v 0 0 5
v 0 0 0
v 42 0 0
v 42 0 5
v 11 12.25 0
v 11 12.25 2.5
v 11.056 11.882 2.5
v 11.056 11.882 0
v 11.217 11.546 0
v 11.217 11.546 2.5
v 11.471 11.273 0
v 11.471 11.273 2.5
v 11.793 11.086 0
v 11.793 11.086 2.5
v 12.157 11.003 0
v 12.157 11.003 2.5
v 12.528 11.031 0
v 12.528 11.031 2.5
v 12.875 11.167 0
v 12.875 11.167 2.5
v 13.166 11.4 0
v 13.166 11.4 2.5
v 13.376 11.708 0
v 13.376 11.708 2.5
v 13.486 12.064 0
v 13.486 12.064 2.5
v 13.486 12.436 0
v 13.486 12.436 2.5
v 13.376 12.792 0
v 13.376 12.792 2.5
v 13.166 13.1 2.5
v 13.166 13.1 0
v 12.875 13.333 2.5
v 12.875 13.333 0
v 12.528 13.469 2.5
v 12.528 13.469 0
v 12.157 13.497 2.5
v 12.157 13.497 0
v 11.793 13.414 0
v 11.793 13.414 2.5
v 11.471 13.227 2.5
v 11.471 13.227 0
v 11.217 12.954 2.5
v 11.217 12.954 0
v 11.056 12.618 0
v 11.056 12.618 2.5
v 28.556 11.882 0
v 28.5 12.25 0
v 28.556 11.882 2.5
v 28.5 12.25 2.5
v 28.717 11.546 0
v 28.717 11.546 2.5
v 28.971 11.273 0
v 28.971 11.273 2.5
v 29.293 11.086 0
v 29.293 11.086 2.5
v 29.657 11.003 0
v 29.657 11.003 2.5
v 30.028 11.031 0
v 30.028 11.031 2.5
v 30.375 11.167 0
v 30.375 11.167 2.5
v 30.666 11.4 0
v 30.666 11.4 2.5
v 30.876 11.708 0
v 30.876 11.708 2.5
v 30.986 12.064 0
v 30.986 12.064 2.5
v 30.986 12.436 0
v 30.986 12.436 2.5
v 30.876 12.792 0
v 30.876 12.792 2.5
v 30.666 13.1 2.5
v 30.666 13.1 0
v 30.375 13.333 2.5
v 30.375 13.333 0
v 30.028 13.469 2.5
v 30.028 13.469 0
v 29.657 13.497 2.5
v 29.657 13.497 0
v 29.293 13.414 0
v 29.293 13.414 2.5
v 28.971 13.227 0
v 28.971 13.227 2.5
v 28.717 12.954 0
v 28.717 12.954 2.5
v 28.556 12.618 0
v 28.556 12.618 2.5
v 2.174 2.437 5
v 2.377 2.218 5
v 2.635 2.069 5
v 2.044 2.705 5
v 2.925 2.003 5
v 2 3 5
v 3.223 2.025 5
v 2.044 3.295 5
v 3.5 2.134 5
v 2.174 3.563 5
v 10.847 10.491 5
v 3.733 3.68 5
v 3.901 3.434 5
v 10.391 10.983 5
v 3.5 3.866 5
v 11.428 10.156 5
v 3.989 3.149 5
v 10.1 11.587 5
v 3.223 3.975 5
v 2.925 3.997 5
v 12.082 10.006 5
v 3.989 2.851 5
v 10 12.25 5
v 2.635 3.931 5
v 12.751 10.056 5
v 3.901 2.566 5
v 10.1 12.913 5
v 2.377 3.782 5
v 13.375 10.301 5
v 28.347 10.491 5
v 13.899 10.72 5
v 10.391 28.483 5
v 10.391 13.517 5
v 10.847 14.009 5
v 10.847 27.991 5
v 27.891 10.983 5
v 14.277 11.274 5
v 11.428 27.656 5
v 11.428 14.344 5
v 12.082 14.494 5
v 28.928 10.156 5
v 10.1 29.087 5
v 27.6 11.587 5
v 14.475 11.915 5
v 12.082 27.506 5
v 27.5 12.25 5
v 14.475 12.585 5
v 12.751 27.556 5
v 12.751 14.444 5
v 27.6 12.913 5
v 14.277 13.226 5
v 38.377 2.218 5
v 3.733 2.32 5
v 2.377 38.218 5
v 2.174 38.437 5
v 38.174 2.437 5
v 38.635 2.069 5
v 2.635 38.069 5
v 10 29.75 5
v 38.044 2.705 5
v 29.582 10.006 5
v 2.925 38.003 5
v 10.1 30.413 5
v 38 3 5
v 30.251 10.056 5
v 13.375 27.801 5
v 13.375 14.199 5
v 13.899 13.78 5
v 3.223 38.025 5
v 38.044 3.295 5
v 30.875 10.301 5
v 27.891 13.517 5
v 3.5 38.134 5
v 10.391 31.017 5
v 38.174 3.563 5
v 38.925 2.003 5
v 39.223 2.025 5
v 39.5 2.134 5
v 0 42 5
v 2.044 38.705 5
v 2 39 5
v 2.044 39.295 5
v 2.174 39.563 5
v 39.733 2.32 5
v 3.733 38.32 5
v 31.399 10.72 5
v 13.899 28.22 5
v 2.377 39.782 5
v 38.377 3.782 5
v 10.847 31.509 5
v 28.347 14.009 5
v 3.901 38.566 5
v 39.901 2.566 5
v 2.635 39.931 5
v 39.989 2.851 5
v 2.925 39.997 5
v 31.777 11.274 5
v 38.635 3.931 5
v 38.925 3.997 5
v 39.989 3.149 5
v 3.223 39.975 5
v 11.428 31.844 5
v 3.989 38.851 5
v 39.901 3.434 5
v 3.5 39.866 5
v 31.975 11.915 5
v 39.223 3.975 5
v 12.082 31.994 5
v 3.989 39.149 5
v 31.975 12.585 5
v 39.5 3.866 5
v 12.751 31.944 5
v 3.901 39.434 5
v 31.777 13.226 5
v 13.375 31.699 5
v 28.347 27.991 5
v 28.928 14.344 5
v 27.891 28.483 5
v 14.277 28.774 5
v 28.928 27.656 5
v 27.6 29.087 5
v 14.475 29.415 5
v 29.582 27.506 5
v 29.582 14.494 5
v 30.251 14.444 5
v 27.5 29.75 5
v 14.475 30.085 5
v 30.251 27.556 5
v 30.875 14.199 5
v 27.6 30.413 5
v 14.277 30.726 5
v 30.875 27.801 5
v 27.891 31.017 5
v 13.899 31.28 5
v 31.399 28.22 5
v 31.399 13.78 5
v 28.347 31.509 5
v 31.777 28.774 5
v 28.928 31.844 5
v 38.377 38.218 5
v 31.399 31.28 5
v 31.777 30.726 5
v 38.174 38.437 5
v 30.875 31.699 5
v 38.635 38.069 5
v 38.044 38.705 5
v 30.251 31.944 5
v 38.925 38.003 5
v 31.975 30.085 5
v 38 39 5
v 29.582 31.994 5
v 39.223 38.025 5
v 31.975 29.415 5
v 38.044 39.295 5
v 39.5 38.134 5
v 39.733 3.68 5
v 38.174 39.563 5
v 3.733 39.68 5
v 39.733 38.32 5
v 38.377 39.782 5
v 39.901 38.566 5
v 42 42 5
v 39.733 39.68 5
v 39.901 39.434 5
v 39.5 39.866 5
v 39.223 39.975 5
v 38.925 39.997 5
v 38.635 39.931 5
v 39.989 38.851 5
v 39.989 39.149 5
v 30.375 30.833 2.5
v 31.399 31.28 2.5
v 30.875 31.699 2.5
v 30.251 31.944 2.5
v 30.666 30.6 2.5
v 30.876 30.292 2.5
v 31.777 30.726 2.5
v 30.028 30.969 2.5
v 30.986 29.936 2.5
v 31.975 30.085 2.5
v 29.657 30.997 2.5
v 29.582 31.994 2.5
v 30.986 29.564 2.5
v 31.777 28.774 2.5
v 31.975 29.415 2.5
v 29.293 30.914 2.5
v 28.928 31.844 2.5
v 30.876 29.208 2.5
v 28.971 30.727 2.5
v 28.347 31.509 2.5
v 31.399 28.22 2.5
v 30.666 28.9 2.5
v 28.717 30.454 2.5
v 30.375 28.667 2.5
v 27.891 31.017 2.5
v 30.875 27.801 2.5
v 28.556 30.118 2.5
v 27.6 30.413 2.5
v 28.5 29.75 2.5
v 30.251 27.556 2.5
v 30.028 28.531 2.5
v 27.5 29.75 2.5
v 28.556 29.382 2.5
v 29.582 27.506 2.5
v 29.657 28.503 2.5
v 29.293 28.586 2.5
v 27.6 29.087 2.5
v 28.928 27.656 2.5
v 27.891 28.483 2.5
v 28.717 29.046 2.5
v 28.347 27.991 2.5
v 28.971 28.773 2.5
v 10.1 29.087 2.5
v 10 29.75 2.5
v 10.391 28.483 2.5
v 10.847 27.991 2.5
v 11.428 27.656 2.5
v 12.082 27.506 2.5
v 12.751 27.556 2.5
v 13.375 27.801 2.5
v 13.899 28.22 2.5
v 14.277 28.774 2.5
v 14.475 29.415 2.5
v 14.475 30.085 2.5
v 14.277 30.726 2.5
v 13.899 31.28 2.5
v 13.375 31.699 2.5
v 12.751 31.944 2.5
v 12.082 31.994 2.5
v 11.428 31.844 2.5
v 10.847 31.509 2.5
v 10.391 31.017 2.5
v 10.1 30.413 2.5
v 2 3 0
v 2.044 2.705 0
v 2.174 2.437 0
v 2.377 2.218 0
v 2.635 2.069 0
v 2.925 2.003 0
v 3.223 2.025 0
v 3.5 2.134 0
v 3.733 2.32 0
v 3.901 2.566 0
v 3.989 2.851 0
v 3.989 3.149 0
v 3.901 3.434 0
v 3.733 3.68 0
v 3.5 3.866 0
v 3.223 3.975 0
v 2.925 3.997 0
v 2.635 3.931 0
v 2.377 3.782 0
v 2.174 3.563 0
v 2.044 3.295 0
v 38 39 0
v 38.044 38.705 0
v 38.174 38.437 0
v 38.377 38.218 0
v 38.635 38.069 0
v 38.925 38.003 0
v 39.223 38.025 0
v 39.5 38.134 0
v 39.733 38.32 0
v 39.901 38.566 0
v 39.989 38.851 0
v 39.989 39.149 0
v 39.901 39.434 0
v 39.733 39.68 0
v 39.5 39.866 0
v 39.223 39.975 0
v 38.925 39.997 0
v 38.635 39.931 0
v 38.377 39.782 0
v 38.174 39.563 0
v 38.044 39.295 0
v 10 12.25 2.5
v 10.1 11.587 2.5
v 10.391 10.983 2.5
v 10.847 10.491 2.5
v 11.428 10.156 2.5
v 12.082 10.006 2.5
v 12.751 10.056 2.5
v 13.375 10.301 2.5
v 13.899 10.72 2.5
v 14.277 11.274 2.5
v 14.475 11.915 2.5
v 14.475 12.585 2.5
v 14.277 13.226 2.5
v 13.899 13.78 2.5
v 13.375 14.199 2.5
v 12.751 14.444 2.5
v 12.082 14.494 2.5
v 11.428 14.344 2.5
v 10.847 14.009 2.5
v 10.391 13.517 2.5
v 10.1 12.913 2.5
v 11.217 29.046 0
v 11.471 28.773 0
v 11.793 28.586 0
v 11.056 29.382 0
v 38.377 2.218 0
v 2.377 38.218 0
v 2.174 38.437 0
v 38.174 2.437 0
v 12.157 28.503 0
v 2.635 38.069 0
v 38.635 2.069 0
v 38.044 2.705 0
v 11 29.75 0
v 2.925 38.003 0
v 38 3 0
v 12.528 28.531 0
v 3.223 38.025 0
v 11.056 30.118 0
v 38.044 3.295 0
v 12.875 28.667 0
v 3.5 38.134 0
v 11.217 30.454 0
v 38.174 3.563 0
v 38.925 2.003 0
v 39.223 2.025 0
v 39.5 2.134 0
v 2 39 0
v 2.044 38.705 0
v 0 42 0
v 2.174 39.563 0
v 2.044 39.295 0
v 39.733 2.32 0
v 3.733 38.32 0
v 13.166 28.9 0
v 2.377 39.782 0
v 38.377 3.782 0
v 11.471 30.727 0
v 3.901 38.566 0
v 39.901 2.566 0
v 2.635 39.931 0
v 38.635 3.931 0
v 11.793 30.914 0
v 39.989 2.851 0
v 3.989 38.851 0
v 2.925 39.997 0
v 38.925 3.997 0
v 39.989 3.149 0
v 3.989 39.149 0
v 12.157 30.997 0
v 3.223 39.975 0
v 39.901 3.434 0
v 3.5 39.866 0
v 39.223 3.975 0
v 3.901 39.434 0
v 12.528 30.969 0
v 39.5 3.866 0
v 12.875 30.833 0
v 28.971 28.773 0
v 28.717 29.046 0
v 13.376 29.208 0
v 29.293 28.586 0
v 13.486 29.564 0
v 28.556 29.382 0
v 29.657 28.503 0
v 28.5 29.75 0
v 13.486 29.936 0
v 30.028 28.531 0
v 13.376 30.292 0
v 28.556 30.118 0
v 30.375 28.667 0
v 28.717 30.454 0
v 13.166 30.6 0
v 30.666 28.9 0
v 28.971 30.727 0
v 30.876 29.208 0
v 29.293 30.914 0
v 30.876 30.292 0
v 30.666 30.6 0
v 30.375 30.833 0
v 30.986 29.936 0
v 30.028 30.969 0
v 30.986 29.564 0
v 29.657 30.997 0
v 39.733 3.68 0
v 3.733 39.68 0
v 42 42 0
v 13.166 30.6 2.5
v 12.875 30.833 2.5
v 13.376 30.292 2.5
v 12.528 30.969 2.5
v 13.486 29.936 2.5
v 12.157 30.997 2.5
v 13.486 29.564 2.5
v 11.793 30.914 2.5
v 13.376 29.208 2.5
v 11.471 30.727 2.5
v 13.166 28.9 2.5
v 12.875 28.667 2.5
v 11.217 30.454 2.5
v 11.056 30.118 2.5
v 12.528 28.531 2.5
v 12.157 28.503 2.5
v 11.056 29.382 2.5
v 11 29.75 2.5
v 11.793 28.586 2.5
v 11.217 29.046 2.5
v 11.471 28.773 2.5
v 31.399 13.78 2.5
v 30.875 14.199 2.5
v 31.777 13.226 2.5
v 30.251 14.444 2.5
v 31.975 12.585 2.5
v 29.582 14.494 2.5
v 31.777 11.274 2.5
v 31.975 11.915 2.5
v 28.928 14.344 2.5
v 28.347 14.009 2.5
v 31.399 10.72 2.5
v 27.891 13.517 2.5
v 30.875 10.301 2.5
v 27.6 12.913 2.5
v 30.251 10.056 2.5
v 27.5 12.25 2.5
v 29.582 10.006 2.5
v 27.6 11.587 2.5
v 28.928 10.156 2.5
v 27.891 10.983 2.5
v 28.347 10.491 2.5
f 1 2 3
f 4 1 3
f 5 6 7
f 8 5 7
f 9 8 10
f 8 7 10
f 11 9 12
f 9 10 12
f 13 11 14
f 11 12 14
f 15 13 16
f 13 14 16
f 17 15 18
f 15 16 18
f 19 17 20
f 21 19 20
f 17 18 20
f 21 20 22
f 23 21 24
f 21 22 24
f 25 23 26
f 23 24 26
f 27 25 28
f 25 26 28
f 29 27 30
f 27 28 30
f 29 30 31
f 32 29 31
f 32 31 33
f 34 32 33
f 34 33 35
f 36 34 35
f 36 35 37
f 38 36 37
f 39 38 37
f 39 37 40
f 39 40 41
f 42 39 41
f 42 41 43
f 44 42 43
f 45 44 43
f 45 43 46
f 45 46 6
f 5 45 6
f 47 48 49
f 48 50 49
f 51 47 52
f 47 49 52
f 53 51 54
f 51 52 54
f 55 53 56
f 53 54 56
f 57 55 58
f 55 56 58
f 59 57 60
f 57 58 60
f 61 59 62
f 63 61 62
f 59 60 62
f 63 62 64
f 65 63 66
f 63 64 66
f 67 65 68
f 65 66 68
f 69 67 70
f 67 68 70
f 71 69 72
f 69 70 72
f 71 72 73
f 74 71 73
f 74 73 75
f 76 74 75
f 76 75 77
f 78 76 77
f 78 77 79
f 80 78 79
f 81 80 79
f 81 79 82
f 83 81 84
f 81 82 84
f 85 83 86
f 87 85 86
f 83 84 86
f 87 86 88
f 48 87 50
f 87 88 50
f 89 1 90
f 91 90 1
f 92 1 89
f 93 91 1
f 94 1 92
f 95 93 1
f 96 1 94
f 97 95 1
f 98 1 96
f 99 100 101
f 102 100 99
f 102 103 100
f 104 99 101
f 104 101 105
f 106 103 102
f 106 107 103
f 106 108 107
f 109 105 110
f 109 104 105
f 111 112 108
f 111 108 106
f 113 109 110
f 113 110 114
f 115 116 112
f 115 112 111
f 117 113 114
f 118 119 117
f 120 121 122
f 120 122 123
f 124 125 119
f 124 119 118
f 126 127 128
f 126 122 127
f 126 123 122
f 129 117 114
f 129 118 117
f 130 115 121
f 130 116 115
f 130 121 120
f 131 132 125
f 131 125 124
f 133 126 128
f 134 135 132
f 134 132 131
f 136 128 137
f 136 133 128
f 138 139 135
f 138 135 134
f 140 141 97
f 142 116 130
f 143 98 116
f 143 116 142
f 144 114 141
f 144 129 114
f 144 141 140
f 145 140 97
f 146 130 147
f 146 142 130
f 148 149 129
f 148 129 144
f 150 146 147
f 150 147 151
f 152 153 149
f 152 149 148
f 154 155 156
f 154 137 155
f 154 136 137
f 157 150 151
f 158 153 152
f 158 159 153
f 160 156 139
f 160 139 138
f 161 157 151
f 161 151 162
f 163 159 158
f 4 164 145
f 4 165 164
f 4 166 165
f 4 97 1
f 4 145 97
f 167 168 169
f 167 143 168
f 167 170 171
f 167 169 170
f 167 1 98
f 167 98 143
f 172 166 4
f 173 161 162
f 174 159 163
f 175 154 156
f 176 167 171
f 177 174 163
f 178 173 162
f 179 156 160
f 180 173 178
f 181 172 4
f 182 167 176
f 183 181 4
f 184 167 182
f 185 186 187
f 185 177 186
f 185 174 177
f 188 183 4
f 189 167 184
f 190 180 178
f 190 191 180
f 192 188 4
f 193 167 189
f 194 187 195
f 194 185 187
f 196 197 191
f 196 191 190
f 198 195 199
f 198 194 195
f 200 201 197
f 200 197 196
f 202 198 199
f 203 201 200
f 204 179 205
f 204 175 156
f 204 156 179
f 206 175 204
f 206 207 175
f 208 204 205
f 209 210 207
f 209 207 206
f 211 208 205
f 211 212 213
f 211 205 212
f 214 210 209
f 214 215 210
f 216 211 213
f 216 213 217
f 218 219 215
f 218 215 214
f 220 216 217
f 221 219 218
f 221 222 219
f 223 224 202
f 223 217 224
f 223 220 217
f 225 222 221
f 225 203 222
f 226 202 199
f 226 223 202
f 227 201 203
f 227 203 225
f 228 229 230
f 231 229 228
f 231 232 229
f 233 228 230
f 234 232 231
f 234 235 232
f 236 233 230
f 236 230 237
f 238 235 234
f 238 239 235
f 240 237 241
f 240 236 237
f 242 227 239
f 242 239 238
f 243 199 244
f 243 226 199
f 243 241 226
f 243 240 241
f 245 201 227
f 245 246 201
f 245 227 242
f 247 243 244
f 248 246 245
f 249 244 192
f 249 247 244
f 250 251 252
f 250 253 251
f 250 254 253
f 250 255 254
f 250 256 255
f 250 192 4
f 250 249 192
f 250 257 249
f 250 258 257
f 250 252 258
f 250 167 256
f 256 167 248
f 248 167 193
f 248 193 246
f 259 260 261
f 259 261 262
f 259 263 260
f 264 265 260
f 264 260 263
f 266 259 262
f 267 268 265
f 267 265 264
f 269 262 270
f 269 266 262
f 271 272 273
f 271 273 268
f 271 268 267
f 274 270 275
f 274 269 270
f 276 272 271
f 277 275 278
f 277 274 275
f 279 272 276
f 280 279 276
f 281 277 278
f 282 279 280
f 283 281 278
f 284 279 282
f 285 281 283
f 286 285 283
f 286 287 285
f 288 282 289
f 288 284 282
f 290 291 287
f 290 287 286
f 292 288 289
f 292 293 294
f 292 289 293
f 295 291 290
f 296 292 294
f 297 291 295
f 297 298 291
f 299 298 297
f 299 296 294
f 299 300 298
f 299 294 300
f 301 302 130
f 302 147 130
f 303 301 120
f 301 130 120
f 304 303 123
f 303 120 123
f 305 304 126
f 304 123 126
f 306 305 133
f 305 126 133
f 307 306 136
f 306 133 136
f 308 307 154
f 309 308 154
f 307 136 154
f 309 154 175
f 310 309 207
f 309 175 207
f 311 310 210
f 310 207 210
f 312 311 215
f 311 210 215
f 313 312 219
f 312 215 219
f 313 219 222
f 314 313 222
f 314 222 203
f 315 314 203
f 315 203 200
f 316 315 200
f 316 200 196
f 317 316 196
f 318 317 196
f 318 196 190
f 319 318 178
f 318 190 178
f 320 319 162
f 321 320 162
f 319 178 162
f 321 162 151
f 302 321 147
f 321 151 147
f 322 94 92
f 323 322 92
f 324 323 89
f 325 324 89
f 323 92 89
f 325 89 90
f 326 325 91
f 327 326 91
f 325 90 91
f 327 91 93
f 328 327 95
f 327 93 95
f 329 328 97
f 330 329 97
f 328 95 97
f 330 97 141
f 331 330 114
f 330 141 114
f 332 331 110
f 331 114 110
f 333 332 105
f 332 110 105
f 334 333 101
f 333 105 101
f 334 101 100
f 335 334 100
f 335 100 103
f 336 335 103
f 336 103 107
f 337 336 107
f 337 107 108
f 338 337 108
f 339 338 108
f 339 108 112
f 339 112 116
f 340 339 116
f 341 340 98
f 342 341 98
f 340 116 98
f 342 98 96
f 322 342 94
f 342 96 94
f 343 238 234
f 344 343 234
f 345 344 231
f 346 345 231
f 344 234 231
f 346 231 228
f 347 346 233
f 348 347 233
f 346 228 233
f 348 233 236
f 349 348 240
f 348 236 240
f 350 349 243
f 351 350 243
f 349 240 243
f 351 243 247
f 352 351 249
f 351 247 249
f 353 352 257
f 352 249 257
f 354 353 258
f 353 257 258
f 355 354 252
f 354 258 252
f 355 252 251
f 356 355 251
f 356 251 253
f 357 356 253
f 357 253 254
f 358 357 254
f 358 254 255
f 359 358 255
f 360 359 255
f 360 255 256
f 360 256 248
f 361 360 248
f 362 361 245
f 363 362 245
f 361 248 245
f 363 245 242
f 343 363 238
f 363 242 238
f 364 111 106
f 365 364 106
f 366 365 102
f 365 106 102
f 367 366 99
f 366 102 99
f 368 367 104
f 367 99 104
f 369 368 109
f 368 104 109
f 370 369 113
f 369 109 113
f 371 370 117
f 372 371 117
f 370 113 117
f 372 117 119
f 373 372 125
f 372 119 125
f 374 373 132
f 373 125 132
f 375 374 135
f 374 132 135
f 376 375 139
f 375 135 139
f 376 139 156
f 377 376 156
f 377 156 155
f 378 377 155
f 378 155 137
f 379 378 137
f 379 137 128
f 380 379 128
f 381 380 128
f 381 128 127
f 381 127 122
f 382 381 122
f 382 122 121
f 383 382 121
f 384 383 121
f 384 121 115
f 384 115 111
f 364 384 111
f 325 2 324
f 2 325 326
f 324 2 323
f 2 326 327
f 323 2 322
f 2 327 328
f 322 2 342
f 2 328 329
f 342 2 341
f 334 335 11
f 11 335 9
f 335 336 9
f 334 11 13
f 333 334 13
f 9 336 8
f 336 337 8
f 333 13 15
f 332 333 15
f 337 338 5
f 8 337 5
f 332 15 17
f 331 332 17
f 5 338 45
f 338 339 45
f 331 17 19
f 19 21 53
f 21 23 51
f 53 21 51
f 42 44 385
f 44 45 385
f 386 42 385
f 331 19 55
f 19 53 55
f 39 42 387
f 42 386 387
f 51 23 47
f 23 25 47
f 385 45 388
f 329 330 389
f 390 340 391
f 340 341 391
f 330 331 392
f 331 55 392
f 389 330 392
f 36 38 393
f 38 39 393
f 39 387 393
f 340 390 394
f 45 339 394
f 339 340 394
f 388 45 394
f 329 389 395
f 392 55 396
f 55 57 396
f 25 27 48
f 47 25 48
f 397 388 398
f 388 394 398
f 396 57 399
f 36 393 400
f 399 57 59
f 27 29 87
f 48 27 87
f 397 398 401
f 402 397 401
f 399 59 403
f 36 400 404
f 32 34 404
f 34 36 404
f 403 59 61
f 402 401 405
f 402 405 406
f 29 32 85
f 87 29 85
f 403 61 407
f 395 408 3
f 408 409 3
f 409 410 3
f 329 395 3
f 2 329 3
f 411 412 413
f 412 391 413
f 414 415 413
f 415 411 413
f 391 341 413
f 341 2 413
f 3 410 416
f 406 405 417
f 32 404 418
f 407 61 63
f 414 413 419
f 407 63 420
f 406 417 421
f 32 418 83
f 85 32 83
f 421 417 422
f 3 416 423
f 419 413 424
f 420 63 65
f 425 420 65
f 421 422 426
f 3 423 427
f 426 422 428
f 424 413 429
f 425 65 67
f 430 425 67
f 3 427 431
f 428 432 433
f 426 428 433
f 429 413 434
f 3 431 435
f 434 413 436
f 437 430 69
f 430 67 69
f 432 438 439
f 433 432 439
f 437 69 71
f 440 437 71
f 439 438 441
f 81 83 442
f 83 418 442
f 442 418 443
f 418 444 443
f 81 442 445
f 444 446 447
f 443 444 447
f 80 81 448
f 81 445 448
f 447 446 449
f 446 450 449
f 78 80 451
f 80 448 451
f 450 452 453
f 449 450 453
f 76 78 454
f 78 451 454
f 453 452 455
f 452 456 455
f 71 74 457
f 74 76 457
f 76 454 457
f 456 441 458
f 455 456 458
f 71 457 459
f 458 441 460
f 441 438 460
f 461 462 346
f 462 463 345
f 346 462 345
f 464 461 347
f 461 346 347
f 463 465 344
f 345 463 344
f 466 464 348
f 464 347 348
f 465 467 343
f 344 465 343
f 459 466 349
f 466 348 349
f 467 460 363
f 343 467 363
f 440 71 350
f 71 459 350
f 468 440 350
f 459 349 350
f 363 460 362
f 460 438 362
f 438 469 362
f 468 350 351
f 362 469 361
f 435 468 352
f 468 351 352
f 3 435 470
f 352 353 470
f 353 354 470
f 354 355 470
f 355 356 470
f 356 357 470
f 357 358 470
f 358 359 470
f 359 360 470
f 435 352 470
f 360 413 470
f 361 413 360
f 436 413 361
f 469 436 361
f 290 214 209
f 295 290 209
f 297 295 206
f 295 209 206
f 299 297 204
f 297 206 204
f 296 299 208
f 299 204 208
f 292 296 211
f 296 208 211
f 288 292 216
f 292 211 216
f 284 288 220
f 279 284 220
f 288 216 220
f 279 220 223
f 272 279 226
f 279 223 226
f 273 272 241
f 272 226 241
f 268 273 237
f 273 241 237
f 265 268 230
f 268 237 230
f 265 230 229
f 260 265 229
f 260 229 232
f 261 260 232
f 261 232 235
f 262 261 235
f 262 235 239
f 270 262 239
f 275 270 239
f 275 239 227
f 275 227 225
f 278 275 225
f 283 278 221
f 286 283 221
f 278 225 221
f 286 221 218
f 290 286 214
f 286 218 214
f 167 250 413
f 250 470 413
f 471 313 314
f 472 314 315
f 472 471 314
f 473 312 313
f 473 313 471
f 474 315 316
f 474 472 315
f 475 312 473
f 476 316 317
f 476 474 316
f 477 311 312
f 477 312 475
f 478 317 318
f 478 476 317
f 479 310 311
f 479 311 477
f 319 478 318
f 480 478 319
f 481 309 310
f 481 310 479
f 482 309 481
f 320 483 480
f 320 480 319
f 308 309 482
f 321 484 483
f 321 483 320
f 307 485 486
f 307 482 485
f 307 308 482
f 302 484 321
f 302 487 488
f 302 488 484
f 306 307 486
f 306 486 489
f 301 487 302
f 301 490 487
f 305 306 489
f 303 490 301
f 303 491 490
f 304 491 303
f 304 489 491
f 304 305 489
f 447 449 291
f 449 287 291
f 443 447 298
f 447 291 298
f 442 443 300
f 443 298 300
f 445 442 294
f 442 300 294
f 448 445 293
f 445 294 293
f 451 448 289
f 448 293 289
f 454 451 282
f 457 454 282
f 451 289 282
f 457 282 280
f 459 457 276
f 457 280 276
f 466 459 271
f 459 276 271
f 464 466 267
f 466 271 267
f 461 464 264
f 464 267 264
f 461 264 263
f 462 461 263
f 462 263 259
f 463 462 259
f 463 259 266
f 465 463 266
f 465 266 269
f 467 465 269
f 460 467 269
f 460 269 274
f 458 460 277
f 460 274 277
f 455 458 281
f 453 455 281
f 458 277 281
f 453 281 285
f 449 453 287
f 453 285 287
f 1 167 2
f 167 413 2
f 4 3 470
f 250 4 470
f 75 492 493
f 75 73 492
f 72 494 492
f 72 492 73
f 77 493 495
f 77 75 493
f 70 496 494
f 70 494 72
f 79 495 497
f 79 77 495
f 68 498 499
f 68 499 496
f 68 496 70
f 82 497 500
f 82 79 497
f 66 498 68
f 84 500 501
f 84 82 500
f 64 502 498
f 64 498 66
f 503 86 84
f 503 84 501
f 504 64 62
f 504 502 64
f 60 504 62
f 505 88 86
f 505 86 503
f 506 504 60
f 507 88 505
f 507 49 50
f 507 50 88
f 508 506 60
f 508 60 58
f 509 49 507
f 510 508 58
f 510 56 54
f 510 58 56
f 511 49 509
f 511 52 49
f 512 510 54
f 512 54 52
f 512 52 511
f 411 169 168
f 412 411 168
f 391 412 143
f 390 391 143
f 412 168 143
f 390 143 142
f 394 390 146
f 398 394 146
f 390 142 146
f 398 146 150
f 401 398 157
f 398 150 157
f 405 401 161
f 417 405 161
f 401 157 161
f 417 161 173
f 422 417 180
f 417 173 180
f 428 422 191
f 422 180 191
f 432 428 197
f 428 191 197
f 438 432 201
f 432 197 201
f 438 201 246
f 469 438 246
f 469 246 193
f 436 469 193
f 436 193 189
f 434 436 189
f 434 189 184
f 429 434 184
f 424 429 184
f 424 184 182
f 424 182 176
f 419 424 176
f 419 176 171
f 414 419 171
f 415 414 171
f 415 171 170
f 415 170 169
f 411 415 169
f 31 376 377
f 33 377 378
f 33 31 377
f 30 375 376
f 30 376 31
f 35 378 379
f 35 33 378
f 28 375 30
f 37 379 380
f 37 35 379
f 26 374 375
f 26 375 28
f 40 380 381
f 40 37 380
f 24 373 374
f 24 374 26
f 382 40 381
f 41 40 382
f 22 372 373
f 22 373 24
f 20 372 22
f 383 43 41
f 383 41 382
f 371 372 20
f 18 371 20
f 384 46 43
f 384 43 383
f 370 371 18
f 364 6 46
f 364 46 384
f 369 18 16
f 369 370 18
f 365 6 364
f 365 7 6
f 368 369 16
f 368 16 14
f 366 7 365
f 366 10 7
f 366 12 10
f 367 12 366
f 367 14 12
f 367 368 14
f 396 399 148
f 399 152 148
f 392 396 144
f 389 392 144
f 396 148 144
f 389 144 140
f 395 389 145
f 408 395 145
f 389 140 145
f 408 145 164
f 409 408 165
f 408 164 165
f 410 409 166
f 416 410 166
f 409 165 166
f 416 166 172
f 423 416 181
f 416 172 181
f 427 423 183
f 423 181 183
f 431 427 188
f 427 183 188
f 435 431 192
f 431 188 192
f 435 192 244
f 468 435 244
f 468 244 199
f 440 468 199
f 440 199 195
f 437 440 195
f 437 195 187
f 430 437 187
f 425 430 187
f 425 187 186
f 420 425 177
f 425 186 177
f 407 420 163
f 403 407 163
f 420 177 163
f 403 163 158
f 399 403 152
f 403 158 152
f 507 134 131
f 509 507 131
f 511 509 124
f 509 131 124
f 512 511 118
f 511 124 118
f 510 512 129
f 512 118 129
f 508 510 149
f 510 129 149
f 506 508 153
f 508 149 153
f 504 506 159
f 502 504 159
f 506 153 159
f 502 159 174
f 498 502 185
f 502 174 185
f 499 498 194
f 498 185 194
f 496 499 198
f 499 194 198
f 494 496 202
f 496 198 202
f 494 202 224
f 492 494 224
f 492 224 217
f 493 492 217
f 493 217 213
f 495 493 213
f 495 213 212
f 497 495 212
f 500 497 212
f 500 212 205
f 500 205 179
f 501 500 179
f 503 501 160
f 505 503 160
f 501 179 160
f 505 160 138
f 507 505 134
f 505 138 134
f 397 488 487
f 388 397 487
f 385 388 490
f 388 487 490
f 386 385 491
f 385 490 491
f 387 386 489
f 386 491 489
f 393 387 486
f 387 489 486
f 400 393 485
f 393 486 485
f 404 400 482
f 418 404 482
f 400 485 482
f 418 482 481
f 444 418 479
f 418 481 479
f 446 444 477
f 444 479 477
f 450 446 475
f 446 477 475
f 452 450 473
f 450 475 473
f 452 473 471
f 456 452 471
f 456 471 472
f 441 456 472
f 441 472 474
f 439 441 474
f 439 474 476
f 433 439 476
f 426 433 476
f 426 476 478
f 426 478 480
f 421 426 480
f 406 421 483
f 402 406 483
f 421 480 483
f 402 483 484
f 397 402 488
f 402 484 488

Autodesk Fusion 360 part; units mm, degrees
sketch "Base" plane through (0, 0, 0) normal (0, 0, 1) x (1, 0, 0)
  line L0 (0, 0) -> (42, 0)
  line L1 (42, 0) -> (42, 42)
  line L2 (42, 42) -> (0, 42)
  line L3 (0, 42) -> (0, 0)
  dimension "d1" = 42
  dimension "d2" = 42
extrude "Extrude1" add sketch "Base" along normal blind 5
sketch "Mount holes" plane through (0, 0, 5) normal (0, 0, 1) x (-1, 0, 0)
  line L0 (0, -42) -> (0, 0)
  line L1 (0, 0) -> (-42, 0)
  line L2 (-42, 0) -> (-42, -42)
  line L3 (-42, -42) -> (0, -42)
  circle A0 centre (-3, -39) radius 1
  circle A1 centre (-39, -39) radius 1
  circle A2 centre (-3, -3) radius 1
  circle A3 centre (-39, -3) radius 1
  dimension "d8" = 2
  dimension "d9" = 3
  dimension "d10" = 3
  dimension "d11" = 2
  dimension "d12" = 3
  dimension "d13" = 3
  dimension "d14" = 2
  dimension "d15" = 3
  dimension "d16" = 3
  dimension "d17" = 2
  dimension "d18" = 3
  dimension "d19" = 3
extrude "Extrude2" cut sketch "Mount holes" against normal blind 5 contours A0 | A1 | A2 | A3
sketch "Motor holes" plane through (0, 0, 5) normal (0, 0, 1) x (-1, 0, 0)
  circle A0 centre (-39, -39) radius 1
  circle A1 centre (-3, -3) radius 1
  circle A2 centre (-3, -39) radius 1
  circle A3 centre (-39, -3) radius 1
  line L0 (0, -42) -> (0, 0)
  line L1 (0, 0) -> (-42, 0)
  line L2 (-42, 0) -> (-42, -42)
  line L3 (-42, -42) -> (0, -42)
  circle A4 centre (-12.25, -29.75) radius 1.25
  circle A5 centre (-29.75, -29.75) radius 1.25
  circle A6 centre (-12.25, -12.25) radius 1.25
  circle A7 centre (-29.75, -12.25) radius 1.25
  dimension "d22" = 2.5
  dimension "d23" = 2.5
  dimension "d25" = 12.25
  dimension "d27" = 2.5
  dimension "d28" = 2.5
  dimension "d30" = 12.25
  dimension "d31" = 12.25
  dimension "d32" = 12.25
  dimension "d33" = 12.25
  dimension "d34" = 12.25
  dimension "d35" = 12.25
  dimension "d36" = 12.25
extrude "Extrude3" cut sketch "Motor holes" against normal blind 5 contours A4 | A5 | A6 | A7
sketch "Fillets" plane through (0, 0, 5) normal (0, 0, 1) x (-1, 0, 0)
  circle A0 centre (-29.75, -29.75) radius 1.25
  circle A1 centre (-12.25, -12.25) radius 1.25
  circle A2 centre (-12.25, -29.75) radius 1.25
  circle A3 centre (-29.75, -12.25) radius 1.25
  circle A4 centre (-39, -39) radius 1
  circle A5 centre (-3, -3) radius 1
  circle A6 centre (-3, -39) radius 1
  circle A7 centre (-39, -3) radius 1
  line L0 (0, -42) -> (0, 0)
  line L1 (0, 0) -> (-42, 0)
  line L2 (-42, 0) -> (-42, -42)
  line L3 (-42, -42) -> (0, -42)
  circle A8 centre (-12.25, -29.75) radius 2.25
  circle A9 centre (-29.75, -29.75) radius 2.25
  circle A10 centre (-12.25, -12.25) radius 2.25
  circle A11 centre (-29.75, -12.25) radius 2.25
  dimension "d39" = 4.5
  dimension "d40" = 4.5
  dimension "d41" = 4.5
  dimension "d42" = 4.5
extrude "Extrude4" cut sketch "Fillets" against normal blind 2.5 contours A8 | A9 | A10 | A11
